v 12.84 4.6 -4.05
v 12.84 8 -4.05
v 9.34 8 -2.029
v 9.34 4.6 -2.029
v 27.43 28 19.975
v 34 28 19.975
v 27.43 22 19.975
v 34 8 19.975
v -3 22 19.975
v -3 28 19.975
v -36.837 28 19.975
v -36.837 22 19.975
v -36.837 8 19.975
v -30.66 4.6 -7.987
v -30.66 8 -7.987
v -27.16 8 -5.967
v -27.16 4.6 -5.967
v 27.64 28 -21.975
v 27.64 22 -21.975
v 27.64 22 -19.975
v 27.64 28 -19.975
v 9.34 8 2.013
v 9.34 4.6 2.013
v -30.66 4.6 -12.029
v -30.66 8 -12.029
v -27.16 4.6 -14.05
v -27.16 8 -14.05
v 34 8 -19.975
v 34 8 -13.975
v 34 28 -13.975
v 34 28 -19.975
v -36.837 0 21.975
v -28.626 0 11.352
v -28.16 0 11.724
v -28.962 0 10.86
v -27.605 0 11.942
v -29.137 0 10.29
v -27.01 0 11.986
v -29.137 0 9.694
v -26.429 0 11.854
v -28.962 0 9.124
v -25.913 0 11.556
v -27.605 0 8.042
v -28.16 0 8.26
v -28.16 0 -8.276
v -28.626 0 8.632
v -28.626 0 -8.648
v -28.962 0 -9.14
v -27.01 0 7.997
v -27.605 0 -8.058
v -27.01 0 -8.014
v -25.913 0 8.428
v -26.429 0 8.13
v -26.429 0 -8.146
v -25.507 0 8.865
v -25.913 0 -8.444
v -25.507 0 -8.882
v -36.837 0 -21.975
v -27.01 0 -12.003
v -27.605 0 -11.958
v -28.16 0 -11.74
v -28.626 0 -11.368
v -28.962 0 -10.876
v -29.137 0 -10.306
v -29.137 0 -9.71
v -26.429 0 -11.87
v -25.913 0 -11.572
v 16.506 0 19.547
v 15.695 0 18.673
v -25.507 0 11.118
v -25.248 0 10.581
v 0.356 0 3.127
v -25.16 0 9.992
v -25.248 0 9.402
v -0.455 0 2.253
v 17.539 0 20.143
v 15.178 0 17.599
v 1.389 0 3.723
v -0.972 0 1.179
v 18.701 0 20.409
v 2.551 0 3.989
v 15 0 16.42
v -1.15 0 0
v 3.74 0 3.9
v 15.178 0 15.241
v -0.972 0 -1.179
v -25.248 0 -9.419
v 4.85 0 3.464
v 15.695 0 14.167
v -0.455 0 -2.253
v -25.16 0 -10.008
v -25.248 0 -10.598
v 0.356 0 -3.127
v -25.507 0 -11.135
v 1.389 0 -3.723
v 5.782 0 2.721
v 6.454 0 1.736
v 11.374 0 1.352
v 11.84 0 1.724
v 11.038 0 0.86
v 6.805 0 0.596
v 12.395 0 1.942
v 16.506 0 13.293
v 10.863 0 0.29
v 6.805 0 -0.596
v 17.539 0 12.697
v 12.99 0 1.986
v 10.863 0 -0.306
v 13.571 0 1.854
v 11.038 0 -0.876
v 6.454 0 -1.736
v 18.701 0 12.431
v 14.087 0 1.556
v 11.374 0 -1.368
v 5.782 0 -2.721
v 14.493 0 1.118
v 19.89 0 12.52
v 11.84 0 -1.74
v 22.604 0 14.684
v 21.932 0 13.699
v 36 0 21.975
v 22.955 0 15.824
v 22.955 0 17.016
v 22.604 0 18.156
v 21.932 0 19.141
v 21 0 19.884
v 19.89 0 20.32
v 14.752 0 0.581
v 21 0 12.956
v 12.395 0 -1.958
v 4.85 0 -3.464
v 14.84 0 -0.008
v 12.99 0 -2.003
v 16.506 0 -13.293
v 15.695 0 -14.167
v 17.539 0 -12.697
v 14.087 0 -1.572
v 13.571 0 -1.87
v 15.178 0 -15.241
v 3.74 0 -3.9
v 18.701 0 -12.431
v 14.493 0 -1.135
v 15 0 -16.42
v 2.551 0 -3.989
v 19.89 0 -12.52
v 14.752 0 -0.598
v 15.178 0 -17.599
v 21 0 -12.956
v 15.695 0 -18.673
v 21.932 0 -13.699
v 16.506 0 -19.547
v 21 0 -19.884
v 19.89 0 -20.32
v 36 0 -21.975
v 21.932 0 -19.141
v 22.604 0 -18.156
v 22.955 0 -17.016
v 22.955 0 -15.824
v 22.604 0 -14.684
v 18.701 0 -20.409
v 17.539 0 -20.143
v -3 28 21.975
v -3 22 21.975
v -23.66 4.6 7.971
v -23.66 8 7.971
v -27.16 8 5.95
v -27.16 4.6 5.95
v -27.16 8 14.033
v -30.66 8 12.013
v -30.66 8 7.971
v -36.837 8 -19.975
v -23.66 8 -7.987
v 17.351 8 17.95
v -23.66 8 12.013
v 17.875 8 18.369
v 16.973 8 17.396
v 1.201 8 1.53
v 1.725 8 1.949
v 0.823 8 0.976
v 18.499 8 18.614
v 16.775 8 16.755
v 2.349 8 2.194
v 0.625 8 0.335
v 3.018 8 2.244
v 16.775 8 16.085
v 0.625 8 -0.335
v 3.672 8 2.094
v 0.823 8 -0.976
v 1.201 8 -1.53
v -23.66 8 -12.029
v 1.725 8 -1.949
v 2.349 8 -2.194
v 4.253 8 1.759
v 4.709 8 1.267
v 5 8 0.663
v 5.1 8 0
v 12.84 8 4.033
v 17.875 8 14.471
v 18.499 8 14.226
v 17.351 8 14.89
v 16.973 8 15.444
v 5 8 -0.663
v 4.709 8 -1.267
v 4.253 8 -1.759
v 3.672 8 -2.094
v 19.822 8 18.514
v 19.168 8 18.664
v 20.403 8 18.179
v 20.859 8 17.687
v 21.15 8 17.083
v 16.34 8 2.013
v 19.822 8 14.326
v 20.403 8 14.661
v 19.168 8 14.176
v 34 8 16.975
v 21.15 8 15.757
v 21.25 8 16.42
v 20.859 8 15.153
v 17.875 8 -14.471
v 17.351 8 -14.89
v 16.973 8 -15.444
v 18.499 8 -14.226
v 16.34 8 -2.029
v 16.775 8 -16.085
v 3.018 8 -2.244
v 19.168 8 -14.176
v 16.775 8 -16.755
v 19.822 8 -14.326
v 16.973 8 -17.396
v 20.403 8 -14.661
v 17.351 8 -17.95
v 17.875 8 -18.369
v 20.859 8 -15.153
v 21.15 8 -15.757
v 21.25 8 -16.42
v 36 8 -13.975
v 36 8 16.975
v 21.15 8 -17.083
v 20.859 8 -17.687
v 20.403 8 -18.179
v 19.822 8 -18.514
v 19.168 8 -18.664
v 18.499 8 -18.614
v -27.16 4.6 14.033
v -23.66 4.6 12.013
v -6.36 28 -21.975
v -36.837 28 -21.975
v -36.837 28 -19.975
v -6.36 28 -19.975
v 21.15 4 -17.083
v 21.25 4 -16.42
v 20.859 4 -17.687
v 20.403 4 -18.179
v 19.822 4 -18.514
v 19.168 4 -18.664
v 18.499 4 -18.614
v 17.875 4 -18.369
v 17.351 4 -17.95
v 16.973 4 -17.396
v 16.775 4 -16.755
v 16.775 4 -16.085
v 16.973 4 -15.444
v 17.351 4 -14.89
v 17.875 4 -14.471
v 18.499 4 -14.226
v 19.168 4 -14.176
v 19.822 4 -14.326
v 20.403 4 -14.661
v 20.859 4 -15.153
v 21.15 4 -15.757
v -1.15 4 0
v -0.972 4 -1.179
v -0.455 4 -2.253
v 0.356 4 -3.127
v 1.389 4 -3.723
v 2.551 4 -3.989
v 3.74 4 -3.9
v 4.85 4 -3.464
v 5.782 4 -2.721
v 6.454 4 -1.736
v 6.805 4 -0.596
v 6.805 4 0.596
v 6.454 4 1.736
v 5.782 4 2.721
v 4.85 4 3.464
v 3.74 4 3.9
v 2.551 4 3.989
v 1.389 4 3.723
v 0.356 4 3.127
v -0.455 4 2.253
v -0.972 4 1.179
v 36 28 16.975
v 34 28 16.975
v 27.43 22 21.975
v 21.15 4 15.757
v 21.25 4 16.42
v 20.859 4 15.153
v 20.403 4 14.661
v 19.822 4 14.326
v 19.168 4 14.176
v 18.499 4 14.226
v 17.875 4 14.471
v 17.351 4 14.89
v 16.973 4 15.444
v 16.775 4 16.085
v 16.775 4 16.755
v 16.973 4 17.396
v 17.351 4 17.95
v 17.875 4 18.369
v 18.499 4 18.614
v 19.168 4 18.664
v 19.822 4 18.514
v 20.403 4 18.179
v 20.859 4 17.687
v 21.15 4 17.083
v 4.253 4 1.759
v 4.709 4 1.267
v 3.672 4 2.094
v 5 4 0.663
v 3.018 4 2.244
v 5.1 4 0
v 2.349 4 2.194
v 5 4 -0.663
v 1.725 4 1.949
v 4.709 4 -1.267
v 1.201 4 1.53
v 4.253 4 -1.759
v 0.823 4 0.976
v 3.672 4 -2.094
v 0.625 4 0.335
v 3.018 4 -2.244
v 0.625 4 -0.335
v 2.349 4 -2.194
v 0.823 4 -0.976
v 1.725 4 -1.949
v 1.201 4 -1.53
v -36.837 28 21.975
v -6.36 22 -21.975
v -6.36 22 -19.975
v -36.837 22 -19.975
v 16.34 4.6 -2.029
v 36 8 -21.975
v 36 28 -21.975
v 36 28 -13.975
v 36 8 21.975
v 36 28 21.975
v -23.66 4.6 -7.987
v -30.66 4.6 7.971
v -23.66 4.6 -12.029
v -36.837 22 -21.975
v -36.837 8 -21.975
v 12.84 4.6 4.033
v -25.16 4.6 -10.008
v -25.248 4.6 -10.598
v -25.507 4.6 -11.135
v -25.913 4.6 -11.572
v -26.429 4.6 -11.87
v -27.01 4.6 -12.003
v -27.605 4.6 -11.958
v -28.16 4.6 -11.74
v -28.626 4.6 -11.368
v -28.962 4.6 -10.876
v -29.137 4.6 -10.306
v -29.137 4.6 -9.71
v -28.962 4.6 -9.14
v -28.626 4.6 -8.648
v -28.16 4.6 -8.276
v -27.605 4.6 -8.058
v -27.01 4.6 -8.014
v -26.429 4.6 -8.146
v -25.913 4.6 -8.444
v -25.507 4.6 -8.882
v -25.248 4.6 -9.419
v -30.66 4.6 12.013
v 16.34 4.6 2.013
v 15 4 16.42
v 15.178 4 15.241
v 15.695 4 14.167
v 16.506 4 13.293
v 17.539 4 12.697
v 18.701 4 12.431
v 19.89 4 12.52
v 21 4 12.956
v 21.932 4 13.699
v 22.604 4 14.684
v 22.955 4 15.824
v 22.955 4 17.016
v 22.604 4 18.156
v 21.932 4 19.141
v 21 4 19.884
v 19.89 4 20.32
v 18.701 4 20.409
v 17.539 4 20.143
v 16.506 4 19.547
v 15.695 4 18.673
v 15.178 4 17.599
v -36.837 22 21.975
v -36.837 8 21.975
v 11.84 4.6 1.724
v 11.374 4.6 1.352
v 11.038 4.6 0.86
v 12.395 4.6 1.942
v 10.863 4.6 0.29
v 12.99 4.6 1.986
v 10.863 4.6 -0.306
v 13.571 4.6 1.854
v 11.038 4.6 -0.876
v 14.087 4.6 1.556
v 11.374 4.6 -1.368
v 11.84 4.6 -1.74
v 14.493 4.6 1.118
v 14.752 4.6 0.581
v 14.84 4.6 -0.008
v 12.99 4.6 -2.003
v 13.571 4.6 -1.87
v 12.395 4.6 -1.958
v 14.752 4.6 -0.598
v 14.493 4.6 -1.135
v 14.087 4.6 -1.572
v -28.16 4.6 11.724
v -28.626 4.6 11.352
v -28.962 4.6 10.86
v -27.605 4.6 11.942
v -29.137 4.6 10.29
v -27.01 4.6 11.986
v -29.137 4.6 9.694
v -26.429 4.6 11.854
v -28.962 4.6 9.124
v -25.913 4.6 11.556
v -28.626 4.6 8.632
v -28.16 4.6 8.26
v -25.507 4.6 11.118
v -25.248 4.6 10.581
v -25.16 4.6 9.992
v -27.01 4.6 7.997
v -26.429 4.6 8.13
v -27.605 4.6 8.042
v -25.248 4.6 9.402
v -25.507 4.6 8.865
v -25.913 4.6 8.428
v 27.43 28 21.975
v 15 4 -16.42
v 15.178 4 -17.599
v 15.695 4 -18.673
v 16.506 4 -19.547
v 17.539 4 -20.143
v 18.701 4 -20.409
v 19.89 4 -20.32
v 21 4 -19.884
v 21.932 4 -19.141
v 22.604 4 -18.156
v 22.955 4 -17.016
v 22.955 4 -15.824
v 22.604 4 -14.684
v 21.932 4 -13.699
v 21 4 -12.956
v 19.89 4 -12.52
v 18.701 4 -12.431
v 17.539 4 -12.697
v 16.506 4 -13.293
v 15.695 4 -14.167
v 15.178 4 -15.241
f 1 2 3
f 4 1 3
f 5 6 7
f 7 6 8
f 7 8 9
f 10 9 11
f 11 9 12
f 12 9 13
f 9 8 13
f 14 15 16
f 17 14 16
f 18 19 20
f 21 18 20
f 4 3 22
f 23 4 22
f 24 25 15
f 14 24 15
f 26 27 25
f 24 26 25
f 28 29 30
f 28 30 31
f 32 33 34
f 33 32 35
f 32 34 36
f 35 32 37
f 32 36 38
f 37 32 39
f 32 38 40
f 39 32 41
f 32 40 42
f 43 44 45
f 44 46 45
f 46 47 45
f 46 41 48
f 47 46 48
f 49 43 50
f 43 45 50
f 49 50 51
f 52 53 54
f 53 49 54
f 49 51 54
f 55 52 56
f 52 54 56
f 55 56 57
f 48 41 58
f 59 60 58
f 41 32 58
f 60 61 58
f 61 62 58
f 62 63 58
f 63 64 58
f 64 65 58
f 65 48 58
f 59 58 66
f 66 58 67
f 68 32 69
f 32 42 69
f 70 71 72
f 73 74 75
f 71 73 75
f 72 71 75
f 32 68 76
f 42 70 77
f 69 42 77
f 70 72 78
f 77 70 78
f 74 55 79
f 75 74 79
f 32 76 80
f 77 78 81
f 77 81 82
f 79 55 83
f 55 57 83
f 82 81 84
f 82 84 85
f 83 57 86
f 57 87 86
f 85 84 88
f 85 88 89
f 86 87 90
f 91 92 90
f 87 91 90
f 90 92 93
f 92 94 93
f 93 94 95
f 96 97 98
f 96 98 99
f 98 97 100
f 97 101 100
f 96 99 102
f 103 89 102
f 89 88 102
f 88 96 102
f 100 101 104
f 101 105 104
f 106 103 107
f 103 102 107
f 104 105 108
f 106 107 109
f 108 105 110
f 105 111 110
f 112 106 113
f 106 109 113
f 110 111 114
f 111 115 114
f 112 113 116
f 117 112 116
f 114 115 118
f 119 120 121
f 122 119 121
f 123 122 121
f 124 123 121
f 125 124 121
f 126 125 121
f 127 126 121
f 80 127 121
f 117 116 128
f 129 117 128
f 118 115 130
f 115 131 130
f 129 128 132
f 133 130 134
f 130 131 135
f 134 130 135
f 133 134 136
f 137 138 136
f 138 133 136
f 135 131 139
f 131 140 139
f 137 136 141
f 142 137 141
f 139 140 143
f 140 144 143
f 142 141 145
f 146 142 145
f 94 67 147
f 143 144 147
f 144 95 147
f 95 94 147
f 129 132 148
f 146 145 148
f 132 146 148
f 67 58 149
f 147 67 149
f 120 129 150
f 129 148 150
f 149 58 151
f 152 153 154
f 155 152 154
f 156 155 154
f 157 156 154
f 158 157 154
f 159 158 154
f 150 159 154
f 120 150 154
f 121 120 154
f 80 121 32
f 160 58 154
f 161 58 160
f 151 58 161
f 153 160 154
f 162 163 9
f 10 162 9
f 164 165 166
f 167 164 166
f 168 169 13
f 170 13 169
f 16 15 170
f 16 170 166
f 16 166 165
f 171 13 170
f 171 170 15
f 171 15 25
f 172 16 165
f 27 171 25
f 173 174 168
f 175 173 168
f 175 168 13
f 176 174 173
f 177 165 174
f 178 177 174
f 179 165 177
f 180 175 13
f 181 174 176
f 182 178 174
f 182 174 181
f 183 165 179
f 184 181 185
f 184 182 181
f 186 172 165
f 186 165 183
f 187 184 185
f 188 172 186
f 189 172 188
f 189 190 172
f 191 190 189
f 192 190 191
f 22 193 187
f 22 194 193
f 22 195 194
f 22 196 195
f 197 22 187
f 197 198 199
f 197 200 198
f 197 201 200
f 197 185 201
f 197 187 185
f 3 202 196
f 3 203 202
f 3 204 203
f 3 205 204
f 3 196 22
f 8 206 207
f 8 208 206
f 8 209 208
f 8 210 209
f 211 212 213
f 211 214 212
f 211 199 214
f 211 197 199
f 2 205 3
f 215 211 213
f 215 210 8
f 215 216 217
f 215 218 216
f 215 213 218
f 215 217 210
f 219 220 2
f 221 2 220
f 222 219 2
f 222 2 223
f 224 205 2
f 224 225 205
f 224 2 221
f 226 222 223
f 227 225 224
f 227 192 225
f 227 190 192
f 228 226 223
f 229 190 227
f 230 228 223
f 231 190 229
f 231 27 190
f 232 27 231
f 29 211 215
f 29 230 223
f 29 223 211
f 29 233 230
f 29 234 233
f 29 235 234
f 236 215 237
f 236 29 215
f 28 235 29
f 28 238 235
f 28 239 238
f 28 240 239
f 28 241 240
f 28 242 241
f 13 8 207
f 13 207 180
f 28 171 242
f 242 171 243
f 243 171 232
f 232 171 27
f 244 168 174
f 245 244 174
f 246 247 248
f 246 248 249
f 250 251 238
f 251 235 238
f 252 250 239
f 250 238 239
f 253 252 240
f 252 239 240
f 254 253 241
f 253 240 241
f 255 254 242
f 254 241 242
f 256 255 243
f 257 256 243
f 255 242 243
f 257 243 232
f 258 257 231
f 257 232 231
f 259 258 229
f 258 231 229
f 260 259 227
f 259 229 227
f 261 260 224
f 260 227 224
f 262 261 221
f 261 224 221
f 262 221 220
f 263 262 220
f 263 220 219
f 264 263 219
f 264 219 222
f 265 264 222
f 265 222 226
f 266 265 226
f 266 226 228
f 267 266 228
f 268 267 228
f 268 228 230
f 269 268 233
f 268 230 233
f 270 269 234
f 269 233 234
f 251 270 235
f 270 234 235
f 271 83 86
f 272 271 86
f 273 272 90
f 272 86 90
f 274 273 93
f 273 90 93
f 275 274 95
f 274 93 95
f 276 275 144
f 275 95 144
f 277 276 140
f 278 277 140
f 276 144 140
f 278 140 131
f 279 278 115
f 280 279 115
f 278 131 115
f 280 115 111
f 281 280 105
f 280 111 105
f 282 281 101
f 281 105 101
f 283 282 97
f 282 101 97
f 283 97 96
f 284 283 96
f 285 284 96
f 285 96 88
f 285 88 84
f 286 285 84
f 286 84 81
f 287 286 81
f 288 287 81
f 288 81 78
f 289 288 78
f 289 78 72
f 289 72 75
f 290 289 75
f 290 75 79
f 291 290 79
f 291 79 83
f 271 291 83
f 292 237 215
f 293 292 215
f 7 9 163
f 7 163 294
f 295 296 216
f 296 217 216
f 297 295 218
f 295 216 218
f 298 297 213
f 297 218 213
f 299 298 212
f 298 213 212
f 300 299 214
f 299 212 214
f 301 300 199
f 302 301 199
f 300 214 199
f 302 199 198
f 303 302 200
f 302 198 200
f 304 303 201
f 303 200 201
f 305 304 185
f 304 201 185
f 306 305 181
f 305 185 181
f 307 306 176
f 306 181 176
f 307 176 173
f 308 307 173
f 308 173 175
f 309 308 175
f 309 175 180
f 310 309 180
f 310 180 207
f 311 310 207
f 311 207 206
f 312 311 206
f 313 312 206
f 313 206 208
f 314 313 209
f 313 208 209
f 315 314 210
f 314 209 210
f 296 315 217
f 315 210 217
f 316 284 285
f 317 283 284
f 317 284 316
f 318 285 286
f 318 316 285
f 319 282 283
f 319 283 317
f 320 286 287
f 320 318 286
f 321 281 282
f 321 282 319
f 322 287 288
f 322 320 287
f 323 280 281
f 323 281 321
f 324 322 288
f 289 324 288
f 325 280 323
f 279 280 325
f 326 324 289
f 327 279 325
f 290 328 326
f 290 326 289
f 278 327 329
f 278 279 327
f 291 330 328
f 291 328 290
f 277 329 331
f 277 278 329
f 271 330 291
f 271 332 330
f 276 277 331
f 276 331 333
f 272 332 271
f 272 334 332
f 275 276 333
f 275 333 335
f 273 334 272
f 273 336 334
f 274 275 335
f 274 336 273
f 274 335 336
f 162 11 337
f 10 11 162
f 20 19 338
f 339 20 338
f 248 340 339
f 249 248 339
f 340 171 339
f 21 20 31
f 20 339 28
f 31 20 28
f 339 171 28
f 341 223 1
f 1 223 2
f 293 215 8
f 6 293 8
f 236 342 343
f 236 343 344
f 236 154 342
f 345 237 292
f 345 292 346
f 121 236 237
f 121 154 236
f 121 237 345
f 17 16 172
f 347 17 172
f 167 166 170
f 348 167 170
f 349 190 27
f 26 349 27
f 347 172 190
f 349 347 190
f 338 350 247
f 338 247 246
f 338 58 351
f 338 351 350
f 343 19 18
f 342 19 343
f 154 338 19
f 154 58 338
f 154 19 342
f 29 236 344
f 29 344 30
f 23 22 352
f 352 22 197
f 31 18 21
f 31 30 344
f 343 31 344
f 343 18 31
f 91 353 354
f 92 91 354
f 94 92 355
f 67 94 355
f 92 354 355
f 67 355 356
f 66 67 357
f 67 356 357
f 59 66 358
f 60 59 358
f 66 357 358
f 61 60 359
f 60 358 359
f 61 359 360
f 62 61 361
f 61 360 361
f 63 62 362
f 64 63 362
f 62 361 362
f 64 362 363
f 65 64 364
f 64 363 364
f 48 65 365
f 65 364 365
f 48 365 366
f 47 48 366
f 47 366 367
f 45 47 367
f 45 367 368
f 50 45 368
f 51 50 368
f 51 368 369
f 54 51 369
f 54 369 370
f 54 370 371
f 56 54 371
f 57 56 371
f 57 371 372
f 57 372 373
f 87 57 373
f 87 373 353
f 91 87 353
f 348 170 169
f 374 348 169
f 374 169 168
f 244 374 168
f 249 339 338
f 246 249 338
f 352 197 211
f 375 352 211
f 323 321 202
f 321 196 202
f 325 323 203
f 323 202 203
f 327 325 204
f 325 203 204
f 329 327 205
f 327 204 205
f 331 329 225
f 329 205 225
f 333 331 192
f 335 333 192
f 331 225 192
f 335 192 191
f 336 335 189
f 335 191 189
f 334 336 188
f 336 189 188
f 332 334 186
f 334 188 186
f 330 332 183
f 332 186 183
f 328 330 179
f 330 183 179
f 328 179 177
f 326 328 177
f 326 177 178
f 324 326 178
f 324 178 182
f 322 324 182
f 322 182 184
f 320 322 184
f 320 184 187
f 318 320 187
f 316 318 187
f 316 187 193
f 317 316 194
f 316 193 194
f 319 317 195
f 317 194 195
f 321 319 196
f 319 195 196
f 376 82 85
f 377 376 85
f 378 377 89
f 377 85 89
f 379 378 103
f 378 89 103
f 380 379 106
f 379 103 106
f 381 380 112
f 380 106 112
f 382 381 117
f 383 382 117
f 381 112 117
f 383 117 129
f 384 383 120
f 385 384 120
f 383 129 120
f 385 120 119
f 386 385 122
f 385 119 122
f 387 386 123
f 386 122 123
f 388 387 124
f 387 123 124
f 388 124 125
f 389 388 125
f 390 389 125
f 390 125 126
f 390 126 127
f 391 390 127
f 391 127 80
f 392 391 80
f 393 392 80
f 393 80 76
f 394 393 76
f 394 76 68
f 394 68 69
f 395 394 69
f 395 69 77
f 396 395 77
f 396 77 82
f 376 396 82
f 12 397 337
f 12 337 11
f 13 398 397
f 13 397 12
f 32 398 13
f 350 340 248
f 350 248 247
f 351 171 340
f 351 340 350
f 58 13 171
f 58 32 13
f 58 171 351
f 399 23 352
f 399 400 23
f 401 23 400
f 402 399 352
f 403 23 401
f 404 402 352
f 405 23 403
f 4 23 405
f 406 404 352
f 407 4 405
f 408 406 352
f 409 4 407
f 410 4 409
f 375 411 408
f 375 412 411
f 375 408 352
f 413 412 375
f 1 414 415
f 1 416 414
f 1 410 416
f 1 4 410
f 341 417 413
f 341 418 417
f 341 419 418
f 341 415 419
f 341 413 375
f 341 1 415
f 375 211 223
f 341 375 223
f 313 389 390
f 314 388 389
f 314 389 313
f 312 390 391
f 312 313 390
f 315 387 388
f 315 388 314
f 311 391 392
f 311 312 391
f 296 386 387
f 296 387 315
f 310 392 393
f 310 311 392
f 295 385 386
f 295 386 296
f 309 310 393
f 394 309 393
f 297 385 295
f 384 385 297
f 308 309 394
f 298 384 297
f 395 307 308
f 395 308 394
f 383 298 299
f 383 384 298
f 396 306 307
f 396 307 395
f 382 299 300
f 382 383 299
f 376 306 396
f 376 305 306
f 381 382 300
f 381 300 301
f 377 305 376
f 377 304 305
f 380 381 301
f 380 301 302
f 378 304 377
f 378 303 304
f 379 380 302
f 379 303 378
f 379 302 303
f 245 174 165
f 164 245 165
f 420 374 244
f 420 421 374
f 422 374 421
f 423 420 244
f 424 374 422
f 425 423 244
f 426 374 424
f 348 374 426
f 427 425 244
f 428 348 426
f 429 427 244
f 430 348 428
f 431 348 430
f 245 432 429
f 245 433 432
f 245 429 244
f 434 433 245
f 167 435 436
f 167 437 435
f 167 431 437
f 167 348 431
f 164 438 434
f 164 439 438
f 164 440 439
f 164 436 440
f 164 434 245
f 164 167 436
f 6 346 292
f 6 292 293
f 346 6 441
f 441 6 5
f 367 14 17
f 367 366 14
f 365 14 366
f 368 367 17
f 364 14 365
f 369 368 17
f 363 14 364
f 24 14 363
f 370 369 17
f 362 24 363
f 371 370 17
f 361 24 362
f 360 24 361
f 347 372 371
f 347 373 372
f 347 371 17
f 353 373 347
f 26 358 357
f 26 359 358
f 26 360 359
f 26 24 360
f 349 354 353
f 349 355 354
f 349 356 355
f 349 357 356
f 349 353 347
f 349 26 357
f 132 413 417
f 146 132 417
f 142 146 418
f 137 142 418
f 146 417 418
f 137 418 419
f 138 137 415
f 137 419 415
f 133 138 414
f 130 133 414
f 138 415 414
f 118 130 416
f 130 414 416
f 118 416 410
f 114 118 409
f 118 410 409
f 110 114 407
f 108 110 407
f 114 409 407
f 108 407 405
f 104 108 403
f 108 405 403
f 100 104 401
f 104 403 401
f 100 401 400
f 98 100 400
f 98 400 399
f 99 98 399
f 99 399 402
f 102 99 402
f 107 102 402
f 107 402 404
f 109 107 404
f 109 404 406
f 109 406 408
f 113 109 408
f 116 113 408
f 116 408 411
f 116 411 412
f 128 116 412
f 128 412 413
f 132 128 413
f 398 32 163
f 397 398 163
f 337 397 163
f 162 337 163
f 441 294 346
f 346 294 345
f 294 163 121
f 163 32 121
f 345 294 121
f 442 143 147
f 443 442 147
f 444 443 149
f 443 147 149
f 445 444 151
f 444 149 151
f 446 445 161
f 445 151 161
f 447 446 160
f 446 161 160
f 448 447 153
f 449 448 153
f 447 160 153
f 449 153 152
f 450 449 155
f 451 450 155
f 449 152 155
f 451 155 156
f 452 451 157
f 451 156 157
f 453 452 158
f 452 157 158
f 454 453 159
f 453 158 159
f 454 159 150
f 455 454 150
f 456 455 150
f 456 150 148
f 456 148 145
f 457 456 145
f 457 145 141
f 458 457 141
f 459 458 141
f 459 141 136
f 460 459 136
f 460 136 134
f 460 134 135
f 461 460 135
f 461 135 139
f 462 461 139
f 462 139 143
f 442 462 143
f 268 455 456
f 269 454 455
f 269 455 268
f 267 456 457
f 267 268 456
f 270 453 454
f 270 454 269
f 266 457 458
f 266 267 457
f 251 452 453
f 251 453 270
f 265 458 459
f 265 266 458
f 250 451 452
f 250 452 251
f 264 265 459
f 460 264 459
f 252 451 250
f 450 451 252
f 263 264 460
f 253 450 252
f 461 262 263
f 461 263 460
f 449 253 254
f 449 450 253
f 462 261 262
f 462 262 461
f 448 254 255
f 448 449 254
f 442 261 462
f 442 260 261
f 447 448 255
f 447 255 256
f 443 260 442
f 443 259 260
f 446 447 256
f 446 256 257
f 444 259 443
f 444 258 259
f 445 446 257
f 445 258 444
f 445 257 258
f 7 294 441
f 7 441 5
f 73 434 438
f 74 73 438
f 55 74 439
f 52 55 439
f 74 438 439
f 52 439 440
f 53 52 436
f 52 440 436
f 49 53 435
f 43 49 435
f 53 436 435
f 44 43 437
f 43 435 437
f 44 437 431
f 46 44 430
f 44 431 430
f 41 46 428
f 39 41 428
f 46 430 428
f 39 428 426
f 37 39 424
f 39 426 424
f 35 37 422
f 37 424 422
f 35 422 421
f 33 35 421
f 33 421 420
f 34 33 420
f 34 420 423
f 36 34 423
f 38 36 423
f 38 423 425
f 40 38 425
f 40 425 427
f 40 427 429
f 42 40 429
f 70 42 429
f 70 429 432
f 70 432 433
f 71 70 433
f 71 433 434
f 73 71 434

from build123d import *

# Parameters (mm, degrees)
SKETCH4_W                      = 72.837083297
SKETCH4_H                      = 43.95
BOSS_EXTRUDE1_DEPTH            = 8
BOSS_EXTRUDE2_DEPTH            = 14
SKETCH6_W                      = 30.477083297
SKETCH6_H                      = 2
SKETCH6_W_2                    = 33.837083297
BOSS_EXTRUDE3_DEPTH            = 6
CBORE_FOR_M4_SHCS1_D           = 4.5
CBORE_FOR_M4_SHCS1_CBORE_D     = 8
CBORE_FOR_M4_SHCS1_CBORE_DEPTH = 4
F_4_0MM_DOWEL_HOLE1_D          = 4
CUT_EXTRUDE1_DEPTH             = 3.4


with BuildPart() as part:
    # Sketch4 → Boss-Extrude1 (new body)
    with BuildSketch(Plane(origin=(0, 0, 0), x_dir=(1, 0, 0), z_dir=(0, 1, 0))):
        with Locations((-0.418541648, 0)):
            Rectangle(SKETCH4_W, SKETCH4_H)
    extrude(amount=BOSS_EXTRUDE1_DEPTH)

    # Sketch5 → Boss-Extrude2 (add)
    with BuildSketch(Plane(origin=(0, 8, 0), x_dir=(1, 0, 0), z_dir=(0, 1, 0))):
        Polygon((36, 13.975), (34, 13.975), (34, 19.975), (-36.837083297, 19.975), (-36.837083297, 21.975), (36, 21.975), align=None)
        Polygon((-36.837083297, -21.975), (36, -21.975), (36, -16.975), (34, -16.975), (34, -19.975), (-36.837083297, -19.975), align=None)
    extrude(amount=BOSS_EXTRUDE2_DEPTH)

    # Sketch6 → Boss-Extrude3 (add)
    with BuildSketch(Plane(origin=(0, 22, 0), x_dir=(1, 0, 0), z_dir=(0, 1, 0))):
        with Locations((-21.598541648, 20.975)):
            Rectangle(SKETCH6_W, SKETCH6_H)
        Polygon((36, 21.975), (27.64, 21.975), (27.64, 19.975), (34, 19.975), (34, 13.975), (36, 13.975), align=None)
        Polygon((36, -21.975), (27.43, -21.975), (27.43, -19.975), (34, -19.975), (34, -16.975), (36, -16.975), align=None)
        with Locations((-19.918541648, -20.975)):
            Rectangle(SKETCH6_W_2, SKETCH6_H)
    extrude(amount=BOSS_EXTRUDE3_DEPTH)

    # CBORE for M4 SHCS1 (through all)
    with Locations(Plane(origin=(0, 0, 0), x_dir=(-1, 0, 0), z_dir=(0, -1, 0))):
        with Locations((-2.85, 0), (-19, 16.42), (-19, -16.42)):
            CounterBoreHole(CBORE_FOR_M4_SHCS1_D / 2, CBORE_FOR_M4_SHCS1_CBORE_D / 2, CBORE_FOR_M4_SHCS1_CBORE_DEPTH)

    # Ø4.0mm Dowel Hole1 (through all)
    with Locations(Plane(origin=(0, 0, 0), x_dir=(-1, 0, 0), z_dir=(0, -1, 0))):
        with Locations((-12.84040165, 0.00815259), (27.15959835, 10.00815259), (27.15959835, -9.99184741)):
            Hole(F_4_0MM_DOWEL_HOLE1_D / 2)

    # Sketch12 → Cut-Extrude1 (cut)
    with BuildSketch(Plane(origin=(0, 8, 0), x_dir=(1, 0, 0), z_dir=(0, 1, 0))):
        Polygon((12.84040165, 4.049604475), (9.34040165, 2.028878533), (9.34040165, -2.012573352), (12.84040165, -4.033299294), (16.34040165, -2.012573352), (16.34040165, 2.028878533), align=None)
        Polygon((-27.15959835, 14.049604475), (-30.65959835, 12.028878533), (-30.65959835, 7.987426648), (-27.15959835, 5.966700706), (-23.65959835, 7.987426648), (-23.65959835, 12.028878533), align=None)
        Polygon((-27.15959835, -5.950395525), (-30.65959835, -7.971121467), (-30.65959835, -12.012573352), (-27.15959835, -14.033299294), (-23.65959835, -12.012573352), (-23.65959835, -7.971121467), align=None)
    extrude(amount=-CUT_EXTRUDE1_DEPTH, mode=Mode.SUBTRACT)


solid = part.part
